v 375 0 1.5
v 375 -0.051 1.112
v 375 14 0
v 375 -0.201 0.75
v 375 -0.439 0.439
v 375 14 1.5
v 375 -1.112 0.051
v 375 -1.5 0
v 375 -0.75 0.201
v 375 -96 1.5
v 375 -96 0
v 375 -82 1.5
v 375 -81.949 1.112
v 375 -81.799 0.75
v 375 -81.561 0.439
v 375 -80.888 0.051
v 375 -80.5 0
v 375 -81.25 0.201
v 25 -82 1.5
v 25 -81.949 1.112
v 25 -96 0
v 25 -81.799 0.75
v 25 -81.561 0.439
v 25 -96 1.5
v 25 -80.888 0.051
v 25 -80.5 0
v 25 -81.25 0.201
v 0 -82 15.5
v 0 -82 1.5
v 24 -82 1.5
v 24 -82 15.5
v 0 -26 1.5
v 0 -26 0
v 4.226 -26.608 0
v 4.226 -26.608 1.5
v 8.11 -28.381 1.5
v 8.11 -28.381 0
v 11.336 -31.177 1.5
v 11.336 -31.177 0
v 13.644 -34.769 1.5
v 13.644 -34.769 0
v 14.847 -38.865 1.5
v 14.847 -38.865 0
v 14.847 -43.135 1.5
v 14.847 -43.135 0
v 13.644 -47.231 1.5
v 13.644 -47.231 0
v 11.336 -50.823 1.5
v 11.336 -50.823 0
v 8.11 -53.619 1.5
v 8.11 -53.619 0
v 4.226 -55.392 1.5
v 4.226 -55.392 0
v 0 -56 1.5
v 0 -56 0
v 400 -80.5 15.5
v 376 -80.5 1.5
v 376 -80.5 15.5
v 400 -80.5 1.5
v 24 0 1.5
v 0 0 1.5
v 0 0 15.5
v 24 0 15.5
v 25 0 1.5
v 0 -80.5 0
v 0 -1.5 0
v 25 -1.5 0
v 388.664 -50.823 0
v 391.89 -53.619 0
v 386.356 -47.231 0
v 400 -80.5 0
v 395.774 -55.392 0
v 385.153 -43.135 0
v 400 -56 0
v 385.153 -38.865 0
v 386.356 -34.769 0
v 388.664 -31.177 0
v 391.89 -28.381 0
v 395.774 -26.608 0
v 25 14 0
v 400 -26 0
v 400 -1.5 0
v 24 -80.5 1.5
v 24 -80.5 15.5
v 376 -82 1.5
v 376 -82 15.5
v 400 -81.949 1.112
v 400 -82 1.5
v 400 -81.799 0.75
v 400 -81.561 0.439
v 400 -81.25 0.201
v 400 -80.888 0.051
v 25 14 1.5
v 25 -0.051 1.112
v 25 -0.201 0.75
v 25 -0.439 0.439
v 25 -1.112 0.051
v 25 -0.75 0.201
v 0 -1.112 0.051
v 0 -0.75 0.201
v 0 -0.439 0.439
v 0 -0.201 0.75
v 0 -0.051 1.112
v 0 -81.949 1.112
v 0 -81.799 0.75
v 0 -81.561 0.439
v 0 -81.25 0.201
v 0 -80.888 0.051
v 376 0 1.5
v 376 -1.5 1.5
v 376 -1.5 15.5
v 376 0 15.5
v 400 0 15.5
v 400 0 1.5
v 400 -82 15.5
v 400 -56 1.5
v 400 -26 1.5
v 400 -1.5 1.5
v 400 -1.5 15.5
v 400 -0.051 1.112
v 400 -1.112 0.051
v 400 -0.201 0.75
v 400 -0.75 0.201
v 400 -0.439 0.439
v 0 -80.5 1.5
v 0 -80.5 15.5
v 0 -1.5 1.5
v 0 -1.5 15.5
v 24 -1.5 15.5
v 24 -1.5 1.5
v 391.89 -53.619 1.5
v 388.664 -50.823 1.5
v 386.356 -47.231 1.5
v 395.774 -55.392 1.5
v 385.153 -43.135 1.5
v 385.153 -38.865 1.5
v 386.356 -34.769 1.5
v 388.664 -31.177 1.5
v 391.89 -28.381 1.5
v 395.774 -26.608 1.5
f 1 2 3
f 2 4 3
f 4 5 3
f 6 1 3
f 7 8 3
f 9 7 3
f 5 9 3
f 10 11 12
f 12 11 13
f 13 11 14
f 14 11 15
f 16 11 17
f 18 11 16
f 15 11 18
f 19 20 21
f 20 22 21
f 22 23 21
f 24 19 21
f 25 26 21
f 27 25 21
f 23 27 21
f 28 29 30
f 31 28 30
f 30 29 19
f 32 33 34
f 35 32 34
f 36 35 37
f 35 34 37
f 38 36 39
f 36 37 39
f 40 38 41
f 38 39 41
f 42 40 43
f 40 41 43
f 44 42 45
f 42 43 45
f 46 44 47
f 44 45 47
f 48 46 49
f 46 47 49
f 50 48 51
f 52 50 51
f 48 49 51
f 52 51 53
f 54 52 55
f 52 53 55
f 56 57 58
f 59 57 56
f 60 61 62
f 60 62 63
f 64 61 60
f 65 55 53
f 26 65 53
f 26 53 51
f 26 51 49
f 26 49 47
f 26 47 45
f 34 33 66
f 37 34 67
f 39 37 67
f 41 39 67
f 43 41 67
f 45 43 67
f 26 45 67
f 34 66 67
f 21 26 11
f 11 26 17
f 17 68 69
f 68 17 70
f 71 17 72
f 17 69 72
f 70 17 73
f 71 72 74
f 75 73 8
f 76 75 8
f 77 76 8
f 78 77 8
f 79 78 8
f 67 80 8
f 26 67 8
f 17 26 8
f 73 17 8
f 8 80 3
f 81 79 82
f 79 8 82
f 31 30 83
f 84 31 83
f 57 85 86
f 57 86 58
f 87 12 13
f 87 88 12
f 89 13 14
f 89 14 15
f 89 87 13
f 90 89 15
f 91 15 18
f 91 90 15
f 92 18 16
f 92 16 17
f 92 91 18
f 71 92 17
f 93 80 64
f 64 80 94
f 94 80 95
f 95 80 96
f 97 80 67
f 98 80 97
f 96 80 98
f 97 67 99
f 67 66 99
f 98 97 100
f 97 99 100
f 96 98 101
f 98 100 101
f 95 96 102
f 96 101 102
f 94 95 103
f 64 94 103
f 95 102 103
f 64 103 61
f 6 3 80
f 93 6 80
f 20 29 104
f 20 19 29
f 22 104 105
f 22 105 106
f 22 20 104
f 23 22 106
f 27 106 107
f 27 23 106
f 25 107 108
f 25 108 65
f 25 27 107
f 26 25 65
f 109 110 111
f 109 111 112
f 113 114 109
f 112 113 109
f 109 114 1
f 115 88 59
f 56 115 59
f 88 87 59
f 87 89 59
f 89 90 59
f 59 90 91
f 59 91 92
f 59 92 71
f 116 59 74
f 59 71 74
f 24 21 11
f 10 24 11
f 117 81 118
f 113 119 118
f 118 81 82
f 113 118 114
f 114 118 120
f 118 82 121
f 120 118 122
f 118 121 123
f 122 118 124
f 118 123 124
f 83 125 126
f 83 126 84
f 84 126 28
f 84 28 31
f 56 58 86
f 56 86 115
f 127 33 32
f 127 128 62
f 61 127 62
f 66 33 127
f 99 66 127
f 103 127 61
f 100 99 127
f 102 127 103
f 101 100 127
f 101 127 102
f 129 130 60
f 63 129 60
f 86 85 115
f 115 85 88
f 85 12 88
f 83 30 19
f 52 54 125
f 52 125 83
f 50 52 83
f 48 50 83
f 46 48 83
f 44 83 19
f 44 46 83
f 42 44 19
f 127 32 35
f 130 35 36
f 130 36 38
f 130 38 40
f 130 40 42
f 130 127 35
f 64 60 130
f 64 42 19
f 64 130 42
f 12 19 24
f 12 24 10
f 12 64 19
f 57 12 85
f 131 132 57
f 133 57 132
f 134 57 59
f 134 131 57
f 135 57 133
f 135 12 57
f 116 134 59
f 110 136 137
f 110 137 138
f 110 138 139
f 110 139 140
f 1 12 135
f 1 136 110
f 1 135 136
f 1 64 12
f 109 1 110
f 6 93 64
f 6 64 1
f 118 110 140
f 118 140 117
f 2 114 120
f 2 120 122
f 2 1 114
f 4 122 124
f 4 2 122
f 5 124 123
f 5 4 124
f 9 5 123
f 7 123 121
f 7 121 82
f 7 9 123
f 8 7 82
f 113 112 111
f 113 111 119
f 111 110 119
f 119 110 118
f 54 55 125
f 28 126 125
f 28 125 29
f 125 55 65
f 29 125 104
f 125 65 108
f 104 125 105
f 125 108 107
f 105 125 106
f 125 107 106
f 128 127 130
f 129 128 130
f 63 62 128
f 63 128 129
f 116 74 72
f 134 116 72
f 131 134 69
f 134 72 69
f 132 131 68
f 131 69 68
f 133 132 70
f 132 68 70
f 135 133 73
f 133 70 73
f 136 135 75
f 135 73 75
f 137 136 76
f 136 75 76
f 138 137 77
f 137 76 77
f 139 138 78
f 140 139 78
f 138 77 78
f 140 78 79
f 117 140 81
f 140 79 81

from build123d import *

# Parameters (mm, degrees)
F1_DEPTH = 1.5
F3_W     = 24
F3_H     = 1.5
F4_DEPTH = 14
F5_R     = 1.49999


# Not quite as in the source:
# - a fillet or chamfer is up to 0.001 mm smaller than in the source, because OpenCascade refuses the exact size


with BuildPart() as f1:
    # F0 (on Top) → F1 (new body)
    with BuildSketch(Plane.XY):
        with BuildLine():
            Line((375, 14), (25, 14))
            Line((25, 14), (25, 0))
            Line((25, 0), (0, 0))
            Line((0, 0), (0, -26))
            ThreePointArc((0, -26), (15, -41), (0, -56))
            Line((0, -56), (0, -82))
            Line((0, -82), (25, -82))
            Line((25, -82), (25, -96))
            Line((25, -96), (375, -96))
            Line((375, -96), (375, -82))
            Line((375, -82), (400, -82))
            Line((400, -82), (400, -56))
            ThreePointArc((400, -56), (385, -41), (400, -26))
            Line((400, -26), (400, 0))
            Line((400, 0), (375, 0))
            Line((375, 0), (375, 14))
        make_face()
    extrude(amount=F1_DEPTH)

    # F3 (on face) → F4 (join)
    with BuildSketch(Plane.XY.offset(1.5)):
        with Locations((12, -0.75)):
            Rectangle(F3_W, F3_H)
        with Locations((388, -0.75)):
            Rectangle(F3_W, F3_H)
        with Locations((12, -81.25)):
            Rectangle(F3_W, F3_H)
        with Locations((388, -81.25)):
            Rectangle(F3_W, F3_H)
    extrude(amount=F4_DEPTH)

    # F5 (radius 1.5 in the source; OpenCascade refuses exactly that, so slightly less here)
    f5_edges = [f1.edges().sort_by_distance(p)[0] for p in [
        (12.5, 0, 0),
        (12.5, -82, 0),
        (387.5, -82, 0),
        (387.5, 0, 0),
    ]]
    fillet(f5_edges, radius=F5_R)


solid = f1.part
